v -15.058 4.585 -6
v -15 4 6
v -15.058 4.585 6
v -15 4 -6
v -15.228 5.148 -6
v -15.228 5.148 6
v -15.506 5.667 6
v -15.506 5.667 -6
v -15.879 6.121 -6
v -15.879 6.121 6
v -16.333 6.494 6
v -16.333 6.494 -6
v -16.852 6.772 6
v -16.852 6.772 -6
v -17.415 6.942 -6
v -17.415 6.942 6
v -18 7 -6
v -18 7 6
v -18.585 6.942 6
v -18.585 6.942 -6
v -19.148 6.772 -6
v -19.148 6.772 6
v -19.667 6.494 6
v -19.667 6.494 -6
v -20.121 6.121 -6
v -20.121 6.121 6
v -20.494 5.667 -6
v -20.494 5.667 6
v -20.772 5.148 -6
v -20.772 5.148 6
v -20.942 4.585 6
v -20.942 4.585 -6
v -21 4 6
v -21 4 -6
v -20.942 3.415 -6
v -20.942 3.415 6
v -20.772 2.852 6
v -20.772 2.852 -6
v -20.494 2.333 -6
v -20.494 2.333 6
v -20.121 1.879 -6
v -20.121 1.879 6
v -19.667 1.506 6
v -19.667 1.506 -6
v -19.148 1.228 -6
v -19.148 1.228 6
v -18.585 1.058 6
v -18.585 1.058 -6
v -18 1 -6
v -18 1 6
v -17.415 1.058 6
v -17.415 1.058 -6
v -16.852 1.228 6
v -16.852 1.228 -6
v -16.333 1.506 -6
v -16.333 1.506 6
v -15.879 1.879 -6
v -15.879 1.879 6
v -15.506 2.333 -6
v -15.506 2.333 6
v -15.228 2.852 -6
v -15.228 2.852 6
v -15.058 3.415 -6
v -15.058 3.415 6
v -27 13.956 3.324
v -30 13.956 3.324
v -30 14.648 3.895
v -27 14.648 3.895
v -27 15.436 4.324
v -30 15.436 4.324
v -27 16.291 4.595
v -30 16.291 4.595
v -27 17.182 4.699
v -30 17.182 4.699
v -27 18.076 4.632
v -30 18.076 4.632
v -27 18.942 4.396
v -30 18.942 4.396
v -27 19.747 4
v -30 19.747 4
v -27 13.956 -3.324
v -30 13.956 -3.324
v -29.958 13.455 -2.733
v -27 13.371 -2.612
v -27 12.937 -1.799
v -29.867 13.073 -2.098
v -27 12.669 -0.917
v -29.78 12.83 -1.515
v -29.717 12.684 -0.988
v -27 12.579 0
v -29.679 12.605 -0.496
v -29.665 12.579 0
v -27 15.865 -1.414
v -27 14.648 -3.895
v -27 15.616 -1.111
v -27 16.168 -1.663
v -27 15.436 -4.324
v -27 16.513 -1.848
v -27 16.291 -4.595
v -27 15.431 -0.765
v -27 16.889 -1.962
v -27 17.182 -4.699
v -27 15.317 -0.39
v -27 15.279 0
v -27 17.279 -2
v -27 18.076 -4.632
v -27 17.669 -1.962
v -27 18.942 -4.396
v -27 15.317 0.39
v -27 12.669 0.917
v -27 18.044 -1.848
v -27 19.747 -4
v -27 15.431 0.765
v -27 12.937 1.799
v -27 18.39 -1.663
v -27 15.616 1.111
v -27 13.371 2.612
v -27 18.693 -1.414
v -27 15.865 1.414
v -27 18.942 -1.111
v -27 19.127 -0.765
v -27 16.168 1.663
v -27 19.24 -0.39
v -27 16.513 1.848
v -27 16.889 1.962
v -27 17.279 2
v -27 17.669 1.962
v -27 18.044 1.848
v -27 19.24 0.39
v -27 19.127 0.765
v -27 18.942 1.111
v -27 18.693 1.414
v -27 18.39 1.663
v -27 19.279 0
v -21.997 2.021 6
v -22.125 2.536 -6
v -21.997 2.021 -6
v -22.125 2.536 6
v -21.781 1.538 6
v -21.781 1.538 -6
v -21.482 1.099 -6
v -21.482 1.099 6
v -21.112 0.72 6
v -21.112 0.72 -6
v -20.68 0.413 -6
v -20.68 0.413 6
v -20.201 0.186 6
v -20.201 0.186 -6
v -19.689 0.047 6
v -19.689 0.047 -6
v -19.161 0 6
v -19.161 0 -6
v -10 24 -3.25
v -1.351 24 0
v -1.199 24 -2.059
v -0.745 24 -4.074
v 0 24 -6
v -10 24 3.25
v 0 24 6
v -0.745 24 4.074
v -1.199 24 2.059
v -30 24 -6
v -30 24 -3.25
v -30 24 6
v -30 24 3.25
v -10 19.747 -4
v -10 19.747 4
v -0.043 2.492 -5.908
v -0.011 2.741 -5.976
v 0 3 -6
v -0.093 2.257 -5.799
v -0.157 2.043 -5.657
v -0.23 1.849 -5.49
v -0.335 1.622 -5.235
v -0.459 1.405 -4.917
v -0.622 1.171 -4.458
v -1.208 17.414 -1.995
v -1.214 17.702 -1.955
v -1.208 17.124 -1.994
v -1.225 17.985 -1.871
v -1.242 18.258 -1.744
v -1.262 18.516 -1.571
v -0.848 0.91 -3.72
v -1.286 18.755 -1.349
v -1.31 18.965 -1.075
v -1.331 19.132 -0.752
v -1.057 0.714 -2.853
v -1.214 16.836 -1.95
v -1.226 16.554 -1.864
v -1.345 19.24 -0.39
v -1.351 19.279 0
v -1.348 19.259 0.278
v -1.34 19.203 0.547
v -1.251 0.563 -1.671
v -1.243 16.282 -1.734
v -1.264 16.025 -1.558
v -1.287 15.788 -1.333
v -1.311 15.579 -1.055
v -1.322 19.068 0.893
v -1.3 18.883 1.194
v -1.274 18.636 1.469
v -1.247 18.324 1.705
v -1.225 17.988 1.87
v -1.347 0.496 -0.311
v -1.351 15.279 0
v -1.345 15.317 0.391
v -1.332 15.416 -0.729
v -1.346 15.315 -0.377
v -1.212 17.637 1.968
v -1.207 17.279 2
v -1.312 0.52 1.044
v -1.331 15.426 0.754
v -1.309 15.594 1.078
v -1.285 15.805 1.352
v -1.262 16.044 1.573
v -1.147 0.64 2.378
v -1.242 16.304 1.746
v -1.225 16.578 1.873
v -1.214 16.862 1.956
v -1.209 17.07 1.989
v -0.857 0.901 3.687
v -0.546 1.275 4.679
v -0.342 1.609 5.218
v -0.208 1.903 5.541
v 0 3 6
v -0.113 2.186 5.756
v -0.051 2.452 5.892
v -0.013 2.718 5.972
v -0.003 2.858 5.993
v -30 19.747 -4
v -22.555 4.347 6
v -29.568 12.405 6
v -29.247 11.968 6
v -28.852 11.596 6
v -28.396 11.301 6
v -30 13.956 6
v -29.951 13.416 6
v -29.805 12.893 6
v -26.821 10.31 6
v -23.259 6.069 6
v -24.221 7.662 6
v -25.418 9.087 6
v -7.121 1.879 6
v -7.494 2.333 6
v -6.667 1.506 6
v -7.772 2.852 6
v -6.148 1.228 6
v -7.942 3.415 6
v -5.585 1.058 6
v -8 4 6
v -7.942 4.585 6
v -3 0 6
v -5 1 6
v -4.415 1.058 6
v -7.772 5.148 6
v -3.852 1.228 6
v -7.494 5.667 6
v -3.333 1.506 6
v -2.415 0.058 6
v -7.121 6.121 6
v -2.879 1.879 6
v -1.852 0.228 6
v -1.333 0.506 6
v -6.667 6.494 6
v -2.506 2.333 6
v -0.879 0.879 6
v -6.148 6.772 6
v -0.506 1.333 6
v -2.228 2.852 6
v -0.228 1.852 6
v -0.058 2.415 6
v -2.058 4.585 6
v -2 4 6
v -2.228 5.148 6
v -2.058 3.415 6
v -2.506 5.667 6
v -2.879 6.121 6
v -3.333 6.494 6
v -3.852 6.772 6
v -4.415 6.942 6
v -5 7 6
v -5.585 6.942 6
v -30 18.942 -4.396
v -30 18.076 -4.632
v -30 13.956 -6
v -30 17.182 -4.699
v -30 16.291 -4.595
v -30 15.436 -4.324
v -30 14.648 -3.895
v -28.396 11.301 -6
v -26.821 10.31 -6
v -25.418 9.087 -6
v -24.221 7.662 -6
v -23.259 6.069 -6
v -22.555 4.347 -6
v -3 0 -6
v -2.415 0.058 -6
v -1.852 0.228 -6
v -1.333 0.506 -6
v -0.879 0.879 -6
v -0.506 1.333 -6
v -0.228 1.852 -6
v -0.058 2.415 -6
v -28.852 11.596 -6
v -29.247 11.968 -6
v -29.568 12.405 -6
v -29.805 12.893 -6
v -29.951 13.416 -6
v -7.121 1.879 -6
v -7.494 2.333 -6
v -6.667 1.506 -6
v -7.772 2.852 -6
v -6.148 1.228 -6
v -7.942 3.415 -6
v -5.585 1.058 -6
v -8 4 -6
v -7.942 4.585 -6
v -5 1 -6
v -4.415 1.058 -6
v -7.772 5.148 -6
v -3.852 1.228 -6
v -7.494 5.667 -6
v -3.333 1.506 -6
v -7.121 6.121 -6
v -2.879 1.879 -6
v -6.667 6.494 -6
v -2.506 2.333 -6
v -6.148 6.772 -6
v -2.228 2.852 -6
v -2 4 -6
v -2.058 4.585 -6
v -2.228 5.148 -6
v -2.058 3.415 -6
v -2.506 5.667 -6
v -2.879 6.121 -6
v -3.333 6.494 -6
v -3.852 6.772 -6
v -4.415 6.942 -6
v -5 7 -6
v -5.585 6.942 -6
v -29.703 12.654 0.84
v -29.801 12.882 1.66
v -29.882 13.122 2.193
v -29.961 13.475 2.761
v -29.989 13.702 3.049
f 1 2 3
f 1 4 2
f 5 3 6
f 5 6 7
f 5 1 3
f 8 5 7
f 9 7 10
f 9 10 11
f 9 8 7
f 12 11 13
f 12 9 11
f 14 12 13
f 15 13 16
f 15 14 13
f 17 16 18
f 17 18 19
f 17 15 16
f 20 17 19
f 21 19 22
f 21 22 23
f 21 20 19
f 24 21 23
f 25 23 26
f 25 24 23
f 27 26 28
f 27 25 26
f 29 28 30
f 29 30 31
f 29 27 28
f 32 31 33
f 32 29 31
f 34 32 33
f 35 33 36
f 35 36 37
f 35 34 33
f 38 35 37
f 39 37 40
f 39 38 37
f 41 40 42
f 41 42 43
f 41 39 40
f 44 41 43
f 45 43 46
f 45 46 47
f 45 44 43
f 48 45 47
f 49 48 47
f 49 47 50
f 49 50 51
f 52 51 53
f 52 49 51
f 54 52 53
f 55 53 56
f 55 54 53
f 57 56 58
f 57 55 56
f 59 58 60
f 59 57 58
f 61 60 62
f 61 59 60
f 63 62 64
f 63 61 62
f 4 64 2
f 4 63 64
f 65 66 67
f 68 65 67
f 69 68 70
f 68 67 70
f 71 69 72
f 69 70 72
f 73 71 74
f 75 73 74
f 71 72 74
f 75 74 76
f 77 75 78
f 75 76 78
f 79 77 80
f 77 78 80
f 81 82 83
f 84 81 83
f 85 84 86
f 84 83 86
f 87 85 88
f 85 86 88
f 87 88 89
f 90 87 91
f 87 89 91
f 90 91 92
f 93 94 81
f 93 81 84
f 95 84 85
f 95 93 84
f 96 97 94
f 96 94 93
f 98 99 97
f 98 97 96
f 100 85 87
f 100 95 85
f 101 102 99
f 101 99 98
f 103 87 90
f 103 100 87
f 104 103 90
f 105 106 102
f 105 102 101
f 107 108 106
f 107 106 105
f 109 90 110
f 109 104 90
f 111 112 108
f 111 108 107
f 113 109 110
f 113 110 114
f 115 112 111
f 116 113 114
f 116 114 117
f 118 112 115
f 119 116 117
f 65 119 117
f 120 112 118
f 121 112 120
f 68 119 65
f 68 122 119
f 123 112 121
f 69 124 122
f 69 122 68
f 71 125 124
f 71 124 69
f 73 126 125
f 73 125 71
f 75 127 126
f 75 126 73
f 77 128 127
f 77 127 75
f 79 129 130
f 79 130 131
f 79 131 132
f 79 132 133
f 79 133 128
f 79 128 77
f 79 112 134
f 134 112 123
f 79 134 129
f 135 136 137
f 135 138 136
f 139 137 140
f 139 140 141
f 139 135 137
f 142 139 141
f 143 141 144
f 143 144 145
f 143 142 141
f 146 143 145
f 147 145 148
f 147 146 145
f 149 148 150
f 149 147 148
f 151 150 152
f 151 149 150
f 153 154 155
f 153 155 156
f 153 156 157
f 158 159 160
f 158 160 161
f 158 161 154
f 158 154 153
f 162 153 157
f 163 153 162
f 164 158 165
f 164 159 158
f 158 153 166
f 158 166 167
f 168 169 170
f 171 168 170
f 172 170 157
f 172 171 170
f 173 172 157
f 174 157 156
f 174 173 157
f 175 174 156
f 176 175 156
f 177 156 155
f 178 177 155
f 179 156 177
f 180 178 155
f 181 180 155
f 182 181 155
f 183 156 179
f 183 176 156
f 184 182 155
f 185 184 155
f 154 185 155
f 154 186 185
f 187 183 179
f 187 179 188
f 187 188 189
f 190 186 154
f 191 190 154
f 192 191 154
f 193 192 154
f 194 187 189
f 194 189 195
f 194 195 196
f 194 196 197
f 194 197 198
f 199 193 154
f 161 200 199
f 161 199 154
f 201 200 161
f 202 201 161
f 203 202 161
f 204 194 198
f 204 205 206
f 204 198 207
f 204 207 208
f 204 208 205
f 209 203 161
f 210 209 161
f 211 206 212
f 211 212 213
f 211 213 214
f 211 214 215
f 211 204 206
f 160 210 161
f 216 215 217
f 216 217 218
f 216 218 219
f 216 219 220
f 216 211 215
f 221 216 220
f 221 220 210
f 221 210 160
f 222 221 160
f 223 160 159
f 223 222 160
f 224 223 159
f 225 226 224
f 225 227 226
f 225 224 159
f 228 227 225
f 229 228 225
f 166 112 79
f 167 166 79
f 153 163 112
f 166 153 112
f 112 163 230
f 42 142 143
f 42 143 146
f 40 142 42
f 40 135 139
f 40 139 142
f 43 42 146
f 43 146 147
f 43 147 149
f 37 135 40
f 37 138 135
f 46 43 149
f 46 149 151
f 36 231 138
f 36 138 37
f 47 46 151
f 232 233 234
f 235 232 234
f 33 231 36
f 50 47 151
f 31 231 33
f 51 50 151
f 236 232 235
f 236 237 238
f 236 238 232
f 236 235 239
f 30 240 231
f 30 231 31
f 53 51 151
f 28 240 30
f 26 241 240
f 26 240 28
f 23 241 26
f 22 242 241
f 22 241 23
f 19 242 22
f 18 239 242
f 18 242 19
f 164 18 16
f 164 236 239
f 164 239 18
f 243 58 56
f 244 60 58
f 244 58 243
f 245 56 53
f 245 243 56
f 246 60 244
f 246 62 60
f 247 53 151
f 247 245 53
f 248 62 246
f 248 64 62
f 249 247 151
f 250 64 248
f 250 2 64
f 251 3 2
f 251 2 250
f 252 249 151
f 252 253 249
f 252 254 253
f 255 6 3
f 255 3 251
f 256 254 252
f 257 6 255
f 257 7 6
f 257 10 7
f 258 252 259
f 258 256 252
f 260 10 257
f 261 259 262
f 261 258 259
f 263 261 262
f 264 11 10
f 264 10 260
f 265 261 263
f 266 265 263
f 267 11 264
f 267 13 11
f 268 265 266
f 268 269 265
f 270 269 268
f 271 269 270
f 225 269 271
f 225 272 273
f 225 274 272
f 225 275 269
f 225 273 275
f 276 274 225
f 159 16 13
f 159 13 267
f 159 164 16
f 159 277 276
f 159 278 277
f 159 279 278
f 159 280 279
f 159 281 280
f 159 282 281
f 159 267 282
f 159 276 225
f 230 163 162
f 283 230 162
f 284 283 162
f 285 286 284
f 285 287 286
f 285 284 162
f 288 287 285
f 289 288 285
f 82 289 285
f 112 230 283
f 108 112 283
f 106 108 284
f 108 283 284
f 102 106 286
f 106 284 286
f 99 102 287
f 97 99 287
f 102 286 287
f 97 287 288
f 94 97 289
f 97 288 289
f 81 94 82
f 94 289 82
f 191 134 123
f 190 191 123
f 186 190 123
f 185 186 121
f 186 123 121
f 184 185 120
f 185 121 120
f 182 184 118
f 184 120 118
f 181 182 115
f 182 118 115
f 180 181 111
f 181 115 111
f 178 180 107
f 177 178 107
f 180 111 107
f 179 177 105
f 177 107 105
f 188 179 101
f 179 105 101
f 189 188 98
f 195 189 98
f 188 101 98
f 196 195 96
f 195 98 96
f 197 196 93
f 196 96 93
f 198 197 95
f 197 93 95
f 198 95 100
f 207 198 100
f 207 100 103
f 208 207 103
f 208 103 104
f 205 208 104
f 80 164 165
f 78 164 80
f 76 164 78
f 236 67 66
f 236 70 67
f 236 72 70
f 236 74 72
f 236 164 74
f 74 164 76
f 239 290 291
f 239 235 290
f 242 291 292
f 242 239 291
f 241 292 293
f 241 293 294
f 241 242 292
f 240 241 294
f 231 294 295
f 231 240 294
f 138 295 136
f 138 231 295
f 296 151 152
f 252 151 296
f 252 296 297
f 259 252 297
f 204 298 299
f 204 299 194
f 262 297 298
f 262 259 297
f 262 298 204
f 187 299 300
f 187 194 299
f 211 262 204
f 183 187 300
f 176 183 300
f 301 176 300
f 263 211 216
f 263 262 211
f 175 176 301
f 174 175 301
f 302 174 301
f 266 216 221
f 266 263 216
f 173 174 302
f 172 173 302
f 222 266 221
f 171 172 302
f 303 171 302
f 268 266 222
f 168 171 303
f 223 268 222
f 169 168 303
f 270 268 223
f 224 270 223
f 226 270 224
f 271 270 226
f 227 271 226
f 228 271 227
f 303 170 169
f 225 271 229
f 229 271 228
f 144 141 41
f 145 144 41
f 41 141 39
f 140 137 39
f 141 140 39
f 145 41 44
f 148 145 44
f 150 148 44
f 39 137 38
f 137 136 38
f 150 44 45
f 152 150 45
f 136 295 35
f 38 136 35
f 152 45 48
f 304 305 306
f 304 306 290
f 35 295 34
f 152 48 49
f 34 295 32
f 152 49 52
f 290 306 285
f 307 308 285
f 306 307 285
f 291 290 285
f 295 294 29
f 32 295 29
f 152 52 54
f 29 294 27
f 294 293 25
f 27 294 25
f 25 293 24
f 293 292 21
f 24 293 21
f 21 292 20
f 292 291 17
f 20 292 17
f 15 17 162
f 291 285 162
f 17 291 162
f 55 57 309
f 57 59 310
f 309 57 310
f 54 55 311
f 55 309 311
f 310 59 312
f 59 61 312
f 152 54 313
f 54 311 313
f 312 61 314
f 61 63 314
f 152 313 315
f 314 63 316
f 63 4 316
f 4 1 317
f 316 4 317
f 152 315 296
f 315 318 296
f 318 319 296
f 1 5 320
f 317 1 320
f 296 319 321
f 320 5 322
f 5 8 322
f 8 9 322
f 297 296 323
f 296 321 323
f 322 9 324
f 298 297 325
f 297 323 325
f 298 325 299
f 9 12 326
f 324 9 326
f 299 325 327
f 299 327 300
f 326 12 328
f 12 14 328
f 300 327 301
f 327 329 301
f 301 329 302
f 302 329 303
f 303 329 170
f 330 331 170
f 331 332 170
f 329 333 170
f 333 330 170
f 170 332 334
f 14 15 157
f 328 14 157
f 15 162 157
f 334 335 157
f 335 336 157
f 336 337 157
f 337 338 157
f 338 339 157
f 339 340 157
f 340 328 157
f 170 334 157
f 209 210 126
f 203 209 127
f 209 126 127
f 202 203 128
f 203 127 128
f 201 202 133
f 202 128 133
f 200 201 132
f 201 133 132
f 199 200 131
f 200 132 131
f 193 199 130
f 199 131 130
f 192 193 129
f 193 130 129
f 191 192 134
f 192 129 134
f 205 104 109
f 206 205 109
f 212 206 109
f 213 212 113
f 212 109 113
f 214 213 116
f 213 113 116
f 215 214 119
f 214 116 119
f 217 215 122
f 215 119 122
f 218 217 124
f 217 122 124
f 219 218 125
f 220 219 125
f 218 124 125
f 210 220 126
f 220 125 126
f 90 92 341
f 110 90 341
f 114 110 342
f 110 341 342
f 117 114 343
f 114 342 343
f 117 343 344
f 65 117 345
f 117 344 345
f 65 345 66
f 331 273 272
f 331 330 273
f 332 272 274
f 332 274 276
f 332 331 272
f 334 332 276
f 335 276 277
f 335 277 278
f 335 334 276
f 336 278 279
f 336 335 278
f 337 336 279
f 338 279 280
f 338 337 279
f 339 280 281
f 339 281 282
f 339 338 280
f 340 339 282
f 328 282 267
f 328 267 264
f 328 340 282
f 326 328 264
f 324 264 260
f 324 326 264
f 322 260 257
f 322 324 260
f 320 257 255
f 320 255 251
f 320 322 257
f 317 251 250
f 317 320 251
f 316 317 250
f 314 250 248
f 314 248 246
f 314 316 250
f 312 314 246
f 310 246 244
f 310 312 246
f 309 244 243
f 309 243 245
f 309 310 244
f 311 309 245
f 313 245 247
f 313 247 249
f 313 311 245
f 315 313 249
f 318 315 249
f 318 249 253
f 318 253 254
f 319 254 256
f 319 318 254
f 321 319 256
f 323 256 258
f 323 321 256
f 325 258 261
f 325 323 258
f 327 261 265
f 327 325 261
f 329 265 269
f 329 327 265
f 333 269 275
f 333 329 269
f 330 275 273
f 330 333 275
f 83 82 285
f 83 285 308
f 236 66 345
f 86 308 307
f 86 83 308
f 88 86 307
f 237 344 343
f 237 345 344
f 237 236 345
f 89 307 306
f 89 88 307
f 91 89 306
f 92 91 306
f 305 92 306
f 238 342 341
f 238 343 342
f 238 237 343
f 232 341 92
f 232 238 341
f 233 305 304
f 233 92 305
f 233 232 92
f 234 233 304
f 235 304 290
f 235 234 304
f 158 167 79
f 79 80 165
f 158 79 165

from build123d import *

# Parameters (mm, degrees)
SKETCH_1_R               = 3
EXTRUDE_1_DEPTH          = 6
SKETCH_2_R               = 2
CUT_EXTRUDE_1_DEPTH      = 39.88444419
CUT_EXTRUDE_3_DEPTH      = 20
SKETCH_2_5_R             = 2
CUT_EXTRUDE_4_DEPTH      = 3
CUT_EXTRUDE_5_DEPTH      = 39.884444283
CUT_EXTRUDE_5_DEPTH_BACK = 39.884444283


with BuildPart() as part:
    # 草图1 → 凸台-拉伸1 (new, symmetric)
    with BuildSketch(Plane.XY):
        with BuildLine():
            Line((-19.161323267, 0), (-3, 0))
            ThreePointArc((-3, 0), (-0.878679656, 0.878679656), (0, 3))
            Line((0, 3), (0, 24))
            Line((0, 24), (-30, 24))
            Line((-30, 24), (-30, 13.956143181))
            ThreePointArc((-30, 13.956143181), (-29.567922082, 12.405086708), (-28.396149212, 11.30081507))
            ThreePointArc((-28.396149212, 11.30081507), (-24.221365462, 7.661944199), (-22.125207826, 2.535900525))
            ThreePointArc((-22.125207826, 2.535900525), (-21.111669593, 0.720493647), (-19.161323267, 0))
        make_face()
        with Locations((-18, 4)):
            Circle(SKETCH_1_R, mode=Mode.SUBTRACT)
        with Locations((-5, 4)):
            Circle(SKETCH_1_R, mode=Mode.SUBTRACT)
    extrude(amount=EXTRUDE_1_DEPTH, both=True)

    # 草图2 → 切除-拉伸1 (cut, through all)
    with BuildSketch(Plane.ZY.offset(30)):
        with Locations((0, 17.278746099)):
            Circle(SKETCH_2_R)
    extrude(amount=-CUT_EXTRUDE_1_DEPTH, mode=Mode.SUBTRACT)

    # 草图2<4> → 切除-拉伸3 (cut)
    with BuildSketch(Plane.ZY.offset(30)):
        Polygon((-3.25, 24), (-4, 19.746538635), (4, 19.746538635), (3.25, 24), align=None)
    extrude(amount=-CUT_EXTRUDE_3_DEPTH, mode=Mode.SUBTRACT)

    # 草图2<5> → 切除-拉伸4 (cut)
    with BuildSketch(Plane.ZY.offset(30)):
        with BuildLine():
            Line((4, 19.746538635), (-4, 19.746538635))
            ThreePointArc((-4, 19.746538635), (0, 12.578746099), (4, 19.746538635))
        make_face()
        with Locations((0, 17.278746099)):
            Circle(SKETCH_2_5_R, mode=Mode.SUBTRACT)
    extrude(amount=-CUT_EXTRUDE_4_DEPTH, mode=Mode.SUBTRACT)

    # 草图3 → 切除-拉伸5 (cut, two sides: drawn at the far end of the back side and taken through both)
    with BuildSketch(Plane(origin=(0, 24, 0), x_dir=(1, 0, 0), z_dir=(0, 1, 0)).offset(-CUT_EXTRUDE_5_DEPTH_BACK)):
        with BuildLine():
            Line((31.980847691, 73.421546804), (0, 6))
            ThreePointArc((0, 6), (-1.350889359, 0), (0, -6))
            Line((0, -6), (31.980847691, -73.421546804))
            Line((31.980847691, -73.421546804), (181.224803582, -73.421546804))
            Line((181.224803582, -73.421546804), (181.224803582, 73.421546804))
            Line((181.224803582, 73.421546804), (31.980847691, 73.421546804))
        make_face()
    extrude(amount=CUT_EXTRUDE_5_DEPTH + CUT_EXTRUDE_5_DEPTH_BACK, mode=Mode.SUBTRACT)


solid = part.part
